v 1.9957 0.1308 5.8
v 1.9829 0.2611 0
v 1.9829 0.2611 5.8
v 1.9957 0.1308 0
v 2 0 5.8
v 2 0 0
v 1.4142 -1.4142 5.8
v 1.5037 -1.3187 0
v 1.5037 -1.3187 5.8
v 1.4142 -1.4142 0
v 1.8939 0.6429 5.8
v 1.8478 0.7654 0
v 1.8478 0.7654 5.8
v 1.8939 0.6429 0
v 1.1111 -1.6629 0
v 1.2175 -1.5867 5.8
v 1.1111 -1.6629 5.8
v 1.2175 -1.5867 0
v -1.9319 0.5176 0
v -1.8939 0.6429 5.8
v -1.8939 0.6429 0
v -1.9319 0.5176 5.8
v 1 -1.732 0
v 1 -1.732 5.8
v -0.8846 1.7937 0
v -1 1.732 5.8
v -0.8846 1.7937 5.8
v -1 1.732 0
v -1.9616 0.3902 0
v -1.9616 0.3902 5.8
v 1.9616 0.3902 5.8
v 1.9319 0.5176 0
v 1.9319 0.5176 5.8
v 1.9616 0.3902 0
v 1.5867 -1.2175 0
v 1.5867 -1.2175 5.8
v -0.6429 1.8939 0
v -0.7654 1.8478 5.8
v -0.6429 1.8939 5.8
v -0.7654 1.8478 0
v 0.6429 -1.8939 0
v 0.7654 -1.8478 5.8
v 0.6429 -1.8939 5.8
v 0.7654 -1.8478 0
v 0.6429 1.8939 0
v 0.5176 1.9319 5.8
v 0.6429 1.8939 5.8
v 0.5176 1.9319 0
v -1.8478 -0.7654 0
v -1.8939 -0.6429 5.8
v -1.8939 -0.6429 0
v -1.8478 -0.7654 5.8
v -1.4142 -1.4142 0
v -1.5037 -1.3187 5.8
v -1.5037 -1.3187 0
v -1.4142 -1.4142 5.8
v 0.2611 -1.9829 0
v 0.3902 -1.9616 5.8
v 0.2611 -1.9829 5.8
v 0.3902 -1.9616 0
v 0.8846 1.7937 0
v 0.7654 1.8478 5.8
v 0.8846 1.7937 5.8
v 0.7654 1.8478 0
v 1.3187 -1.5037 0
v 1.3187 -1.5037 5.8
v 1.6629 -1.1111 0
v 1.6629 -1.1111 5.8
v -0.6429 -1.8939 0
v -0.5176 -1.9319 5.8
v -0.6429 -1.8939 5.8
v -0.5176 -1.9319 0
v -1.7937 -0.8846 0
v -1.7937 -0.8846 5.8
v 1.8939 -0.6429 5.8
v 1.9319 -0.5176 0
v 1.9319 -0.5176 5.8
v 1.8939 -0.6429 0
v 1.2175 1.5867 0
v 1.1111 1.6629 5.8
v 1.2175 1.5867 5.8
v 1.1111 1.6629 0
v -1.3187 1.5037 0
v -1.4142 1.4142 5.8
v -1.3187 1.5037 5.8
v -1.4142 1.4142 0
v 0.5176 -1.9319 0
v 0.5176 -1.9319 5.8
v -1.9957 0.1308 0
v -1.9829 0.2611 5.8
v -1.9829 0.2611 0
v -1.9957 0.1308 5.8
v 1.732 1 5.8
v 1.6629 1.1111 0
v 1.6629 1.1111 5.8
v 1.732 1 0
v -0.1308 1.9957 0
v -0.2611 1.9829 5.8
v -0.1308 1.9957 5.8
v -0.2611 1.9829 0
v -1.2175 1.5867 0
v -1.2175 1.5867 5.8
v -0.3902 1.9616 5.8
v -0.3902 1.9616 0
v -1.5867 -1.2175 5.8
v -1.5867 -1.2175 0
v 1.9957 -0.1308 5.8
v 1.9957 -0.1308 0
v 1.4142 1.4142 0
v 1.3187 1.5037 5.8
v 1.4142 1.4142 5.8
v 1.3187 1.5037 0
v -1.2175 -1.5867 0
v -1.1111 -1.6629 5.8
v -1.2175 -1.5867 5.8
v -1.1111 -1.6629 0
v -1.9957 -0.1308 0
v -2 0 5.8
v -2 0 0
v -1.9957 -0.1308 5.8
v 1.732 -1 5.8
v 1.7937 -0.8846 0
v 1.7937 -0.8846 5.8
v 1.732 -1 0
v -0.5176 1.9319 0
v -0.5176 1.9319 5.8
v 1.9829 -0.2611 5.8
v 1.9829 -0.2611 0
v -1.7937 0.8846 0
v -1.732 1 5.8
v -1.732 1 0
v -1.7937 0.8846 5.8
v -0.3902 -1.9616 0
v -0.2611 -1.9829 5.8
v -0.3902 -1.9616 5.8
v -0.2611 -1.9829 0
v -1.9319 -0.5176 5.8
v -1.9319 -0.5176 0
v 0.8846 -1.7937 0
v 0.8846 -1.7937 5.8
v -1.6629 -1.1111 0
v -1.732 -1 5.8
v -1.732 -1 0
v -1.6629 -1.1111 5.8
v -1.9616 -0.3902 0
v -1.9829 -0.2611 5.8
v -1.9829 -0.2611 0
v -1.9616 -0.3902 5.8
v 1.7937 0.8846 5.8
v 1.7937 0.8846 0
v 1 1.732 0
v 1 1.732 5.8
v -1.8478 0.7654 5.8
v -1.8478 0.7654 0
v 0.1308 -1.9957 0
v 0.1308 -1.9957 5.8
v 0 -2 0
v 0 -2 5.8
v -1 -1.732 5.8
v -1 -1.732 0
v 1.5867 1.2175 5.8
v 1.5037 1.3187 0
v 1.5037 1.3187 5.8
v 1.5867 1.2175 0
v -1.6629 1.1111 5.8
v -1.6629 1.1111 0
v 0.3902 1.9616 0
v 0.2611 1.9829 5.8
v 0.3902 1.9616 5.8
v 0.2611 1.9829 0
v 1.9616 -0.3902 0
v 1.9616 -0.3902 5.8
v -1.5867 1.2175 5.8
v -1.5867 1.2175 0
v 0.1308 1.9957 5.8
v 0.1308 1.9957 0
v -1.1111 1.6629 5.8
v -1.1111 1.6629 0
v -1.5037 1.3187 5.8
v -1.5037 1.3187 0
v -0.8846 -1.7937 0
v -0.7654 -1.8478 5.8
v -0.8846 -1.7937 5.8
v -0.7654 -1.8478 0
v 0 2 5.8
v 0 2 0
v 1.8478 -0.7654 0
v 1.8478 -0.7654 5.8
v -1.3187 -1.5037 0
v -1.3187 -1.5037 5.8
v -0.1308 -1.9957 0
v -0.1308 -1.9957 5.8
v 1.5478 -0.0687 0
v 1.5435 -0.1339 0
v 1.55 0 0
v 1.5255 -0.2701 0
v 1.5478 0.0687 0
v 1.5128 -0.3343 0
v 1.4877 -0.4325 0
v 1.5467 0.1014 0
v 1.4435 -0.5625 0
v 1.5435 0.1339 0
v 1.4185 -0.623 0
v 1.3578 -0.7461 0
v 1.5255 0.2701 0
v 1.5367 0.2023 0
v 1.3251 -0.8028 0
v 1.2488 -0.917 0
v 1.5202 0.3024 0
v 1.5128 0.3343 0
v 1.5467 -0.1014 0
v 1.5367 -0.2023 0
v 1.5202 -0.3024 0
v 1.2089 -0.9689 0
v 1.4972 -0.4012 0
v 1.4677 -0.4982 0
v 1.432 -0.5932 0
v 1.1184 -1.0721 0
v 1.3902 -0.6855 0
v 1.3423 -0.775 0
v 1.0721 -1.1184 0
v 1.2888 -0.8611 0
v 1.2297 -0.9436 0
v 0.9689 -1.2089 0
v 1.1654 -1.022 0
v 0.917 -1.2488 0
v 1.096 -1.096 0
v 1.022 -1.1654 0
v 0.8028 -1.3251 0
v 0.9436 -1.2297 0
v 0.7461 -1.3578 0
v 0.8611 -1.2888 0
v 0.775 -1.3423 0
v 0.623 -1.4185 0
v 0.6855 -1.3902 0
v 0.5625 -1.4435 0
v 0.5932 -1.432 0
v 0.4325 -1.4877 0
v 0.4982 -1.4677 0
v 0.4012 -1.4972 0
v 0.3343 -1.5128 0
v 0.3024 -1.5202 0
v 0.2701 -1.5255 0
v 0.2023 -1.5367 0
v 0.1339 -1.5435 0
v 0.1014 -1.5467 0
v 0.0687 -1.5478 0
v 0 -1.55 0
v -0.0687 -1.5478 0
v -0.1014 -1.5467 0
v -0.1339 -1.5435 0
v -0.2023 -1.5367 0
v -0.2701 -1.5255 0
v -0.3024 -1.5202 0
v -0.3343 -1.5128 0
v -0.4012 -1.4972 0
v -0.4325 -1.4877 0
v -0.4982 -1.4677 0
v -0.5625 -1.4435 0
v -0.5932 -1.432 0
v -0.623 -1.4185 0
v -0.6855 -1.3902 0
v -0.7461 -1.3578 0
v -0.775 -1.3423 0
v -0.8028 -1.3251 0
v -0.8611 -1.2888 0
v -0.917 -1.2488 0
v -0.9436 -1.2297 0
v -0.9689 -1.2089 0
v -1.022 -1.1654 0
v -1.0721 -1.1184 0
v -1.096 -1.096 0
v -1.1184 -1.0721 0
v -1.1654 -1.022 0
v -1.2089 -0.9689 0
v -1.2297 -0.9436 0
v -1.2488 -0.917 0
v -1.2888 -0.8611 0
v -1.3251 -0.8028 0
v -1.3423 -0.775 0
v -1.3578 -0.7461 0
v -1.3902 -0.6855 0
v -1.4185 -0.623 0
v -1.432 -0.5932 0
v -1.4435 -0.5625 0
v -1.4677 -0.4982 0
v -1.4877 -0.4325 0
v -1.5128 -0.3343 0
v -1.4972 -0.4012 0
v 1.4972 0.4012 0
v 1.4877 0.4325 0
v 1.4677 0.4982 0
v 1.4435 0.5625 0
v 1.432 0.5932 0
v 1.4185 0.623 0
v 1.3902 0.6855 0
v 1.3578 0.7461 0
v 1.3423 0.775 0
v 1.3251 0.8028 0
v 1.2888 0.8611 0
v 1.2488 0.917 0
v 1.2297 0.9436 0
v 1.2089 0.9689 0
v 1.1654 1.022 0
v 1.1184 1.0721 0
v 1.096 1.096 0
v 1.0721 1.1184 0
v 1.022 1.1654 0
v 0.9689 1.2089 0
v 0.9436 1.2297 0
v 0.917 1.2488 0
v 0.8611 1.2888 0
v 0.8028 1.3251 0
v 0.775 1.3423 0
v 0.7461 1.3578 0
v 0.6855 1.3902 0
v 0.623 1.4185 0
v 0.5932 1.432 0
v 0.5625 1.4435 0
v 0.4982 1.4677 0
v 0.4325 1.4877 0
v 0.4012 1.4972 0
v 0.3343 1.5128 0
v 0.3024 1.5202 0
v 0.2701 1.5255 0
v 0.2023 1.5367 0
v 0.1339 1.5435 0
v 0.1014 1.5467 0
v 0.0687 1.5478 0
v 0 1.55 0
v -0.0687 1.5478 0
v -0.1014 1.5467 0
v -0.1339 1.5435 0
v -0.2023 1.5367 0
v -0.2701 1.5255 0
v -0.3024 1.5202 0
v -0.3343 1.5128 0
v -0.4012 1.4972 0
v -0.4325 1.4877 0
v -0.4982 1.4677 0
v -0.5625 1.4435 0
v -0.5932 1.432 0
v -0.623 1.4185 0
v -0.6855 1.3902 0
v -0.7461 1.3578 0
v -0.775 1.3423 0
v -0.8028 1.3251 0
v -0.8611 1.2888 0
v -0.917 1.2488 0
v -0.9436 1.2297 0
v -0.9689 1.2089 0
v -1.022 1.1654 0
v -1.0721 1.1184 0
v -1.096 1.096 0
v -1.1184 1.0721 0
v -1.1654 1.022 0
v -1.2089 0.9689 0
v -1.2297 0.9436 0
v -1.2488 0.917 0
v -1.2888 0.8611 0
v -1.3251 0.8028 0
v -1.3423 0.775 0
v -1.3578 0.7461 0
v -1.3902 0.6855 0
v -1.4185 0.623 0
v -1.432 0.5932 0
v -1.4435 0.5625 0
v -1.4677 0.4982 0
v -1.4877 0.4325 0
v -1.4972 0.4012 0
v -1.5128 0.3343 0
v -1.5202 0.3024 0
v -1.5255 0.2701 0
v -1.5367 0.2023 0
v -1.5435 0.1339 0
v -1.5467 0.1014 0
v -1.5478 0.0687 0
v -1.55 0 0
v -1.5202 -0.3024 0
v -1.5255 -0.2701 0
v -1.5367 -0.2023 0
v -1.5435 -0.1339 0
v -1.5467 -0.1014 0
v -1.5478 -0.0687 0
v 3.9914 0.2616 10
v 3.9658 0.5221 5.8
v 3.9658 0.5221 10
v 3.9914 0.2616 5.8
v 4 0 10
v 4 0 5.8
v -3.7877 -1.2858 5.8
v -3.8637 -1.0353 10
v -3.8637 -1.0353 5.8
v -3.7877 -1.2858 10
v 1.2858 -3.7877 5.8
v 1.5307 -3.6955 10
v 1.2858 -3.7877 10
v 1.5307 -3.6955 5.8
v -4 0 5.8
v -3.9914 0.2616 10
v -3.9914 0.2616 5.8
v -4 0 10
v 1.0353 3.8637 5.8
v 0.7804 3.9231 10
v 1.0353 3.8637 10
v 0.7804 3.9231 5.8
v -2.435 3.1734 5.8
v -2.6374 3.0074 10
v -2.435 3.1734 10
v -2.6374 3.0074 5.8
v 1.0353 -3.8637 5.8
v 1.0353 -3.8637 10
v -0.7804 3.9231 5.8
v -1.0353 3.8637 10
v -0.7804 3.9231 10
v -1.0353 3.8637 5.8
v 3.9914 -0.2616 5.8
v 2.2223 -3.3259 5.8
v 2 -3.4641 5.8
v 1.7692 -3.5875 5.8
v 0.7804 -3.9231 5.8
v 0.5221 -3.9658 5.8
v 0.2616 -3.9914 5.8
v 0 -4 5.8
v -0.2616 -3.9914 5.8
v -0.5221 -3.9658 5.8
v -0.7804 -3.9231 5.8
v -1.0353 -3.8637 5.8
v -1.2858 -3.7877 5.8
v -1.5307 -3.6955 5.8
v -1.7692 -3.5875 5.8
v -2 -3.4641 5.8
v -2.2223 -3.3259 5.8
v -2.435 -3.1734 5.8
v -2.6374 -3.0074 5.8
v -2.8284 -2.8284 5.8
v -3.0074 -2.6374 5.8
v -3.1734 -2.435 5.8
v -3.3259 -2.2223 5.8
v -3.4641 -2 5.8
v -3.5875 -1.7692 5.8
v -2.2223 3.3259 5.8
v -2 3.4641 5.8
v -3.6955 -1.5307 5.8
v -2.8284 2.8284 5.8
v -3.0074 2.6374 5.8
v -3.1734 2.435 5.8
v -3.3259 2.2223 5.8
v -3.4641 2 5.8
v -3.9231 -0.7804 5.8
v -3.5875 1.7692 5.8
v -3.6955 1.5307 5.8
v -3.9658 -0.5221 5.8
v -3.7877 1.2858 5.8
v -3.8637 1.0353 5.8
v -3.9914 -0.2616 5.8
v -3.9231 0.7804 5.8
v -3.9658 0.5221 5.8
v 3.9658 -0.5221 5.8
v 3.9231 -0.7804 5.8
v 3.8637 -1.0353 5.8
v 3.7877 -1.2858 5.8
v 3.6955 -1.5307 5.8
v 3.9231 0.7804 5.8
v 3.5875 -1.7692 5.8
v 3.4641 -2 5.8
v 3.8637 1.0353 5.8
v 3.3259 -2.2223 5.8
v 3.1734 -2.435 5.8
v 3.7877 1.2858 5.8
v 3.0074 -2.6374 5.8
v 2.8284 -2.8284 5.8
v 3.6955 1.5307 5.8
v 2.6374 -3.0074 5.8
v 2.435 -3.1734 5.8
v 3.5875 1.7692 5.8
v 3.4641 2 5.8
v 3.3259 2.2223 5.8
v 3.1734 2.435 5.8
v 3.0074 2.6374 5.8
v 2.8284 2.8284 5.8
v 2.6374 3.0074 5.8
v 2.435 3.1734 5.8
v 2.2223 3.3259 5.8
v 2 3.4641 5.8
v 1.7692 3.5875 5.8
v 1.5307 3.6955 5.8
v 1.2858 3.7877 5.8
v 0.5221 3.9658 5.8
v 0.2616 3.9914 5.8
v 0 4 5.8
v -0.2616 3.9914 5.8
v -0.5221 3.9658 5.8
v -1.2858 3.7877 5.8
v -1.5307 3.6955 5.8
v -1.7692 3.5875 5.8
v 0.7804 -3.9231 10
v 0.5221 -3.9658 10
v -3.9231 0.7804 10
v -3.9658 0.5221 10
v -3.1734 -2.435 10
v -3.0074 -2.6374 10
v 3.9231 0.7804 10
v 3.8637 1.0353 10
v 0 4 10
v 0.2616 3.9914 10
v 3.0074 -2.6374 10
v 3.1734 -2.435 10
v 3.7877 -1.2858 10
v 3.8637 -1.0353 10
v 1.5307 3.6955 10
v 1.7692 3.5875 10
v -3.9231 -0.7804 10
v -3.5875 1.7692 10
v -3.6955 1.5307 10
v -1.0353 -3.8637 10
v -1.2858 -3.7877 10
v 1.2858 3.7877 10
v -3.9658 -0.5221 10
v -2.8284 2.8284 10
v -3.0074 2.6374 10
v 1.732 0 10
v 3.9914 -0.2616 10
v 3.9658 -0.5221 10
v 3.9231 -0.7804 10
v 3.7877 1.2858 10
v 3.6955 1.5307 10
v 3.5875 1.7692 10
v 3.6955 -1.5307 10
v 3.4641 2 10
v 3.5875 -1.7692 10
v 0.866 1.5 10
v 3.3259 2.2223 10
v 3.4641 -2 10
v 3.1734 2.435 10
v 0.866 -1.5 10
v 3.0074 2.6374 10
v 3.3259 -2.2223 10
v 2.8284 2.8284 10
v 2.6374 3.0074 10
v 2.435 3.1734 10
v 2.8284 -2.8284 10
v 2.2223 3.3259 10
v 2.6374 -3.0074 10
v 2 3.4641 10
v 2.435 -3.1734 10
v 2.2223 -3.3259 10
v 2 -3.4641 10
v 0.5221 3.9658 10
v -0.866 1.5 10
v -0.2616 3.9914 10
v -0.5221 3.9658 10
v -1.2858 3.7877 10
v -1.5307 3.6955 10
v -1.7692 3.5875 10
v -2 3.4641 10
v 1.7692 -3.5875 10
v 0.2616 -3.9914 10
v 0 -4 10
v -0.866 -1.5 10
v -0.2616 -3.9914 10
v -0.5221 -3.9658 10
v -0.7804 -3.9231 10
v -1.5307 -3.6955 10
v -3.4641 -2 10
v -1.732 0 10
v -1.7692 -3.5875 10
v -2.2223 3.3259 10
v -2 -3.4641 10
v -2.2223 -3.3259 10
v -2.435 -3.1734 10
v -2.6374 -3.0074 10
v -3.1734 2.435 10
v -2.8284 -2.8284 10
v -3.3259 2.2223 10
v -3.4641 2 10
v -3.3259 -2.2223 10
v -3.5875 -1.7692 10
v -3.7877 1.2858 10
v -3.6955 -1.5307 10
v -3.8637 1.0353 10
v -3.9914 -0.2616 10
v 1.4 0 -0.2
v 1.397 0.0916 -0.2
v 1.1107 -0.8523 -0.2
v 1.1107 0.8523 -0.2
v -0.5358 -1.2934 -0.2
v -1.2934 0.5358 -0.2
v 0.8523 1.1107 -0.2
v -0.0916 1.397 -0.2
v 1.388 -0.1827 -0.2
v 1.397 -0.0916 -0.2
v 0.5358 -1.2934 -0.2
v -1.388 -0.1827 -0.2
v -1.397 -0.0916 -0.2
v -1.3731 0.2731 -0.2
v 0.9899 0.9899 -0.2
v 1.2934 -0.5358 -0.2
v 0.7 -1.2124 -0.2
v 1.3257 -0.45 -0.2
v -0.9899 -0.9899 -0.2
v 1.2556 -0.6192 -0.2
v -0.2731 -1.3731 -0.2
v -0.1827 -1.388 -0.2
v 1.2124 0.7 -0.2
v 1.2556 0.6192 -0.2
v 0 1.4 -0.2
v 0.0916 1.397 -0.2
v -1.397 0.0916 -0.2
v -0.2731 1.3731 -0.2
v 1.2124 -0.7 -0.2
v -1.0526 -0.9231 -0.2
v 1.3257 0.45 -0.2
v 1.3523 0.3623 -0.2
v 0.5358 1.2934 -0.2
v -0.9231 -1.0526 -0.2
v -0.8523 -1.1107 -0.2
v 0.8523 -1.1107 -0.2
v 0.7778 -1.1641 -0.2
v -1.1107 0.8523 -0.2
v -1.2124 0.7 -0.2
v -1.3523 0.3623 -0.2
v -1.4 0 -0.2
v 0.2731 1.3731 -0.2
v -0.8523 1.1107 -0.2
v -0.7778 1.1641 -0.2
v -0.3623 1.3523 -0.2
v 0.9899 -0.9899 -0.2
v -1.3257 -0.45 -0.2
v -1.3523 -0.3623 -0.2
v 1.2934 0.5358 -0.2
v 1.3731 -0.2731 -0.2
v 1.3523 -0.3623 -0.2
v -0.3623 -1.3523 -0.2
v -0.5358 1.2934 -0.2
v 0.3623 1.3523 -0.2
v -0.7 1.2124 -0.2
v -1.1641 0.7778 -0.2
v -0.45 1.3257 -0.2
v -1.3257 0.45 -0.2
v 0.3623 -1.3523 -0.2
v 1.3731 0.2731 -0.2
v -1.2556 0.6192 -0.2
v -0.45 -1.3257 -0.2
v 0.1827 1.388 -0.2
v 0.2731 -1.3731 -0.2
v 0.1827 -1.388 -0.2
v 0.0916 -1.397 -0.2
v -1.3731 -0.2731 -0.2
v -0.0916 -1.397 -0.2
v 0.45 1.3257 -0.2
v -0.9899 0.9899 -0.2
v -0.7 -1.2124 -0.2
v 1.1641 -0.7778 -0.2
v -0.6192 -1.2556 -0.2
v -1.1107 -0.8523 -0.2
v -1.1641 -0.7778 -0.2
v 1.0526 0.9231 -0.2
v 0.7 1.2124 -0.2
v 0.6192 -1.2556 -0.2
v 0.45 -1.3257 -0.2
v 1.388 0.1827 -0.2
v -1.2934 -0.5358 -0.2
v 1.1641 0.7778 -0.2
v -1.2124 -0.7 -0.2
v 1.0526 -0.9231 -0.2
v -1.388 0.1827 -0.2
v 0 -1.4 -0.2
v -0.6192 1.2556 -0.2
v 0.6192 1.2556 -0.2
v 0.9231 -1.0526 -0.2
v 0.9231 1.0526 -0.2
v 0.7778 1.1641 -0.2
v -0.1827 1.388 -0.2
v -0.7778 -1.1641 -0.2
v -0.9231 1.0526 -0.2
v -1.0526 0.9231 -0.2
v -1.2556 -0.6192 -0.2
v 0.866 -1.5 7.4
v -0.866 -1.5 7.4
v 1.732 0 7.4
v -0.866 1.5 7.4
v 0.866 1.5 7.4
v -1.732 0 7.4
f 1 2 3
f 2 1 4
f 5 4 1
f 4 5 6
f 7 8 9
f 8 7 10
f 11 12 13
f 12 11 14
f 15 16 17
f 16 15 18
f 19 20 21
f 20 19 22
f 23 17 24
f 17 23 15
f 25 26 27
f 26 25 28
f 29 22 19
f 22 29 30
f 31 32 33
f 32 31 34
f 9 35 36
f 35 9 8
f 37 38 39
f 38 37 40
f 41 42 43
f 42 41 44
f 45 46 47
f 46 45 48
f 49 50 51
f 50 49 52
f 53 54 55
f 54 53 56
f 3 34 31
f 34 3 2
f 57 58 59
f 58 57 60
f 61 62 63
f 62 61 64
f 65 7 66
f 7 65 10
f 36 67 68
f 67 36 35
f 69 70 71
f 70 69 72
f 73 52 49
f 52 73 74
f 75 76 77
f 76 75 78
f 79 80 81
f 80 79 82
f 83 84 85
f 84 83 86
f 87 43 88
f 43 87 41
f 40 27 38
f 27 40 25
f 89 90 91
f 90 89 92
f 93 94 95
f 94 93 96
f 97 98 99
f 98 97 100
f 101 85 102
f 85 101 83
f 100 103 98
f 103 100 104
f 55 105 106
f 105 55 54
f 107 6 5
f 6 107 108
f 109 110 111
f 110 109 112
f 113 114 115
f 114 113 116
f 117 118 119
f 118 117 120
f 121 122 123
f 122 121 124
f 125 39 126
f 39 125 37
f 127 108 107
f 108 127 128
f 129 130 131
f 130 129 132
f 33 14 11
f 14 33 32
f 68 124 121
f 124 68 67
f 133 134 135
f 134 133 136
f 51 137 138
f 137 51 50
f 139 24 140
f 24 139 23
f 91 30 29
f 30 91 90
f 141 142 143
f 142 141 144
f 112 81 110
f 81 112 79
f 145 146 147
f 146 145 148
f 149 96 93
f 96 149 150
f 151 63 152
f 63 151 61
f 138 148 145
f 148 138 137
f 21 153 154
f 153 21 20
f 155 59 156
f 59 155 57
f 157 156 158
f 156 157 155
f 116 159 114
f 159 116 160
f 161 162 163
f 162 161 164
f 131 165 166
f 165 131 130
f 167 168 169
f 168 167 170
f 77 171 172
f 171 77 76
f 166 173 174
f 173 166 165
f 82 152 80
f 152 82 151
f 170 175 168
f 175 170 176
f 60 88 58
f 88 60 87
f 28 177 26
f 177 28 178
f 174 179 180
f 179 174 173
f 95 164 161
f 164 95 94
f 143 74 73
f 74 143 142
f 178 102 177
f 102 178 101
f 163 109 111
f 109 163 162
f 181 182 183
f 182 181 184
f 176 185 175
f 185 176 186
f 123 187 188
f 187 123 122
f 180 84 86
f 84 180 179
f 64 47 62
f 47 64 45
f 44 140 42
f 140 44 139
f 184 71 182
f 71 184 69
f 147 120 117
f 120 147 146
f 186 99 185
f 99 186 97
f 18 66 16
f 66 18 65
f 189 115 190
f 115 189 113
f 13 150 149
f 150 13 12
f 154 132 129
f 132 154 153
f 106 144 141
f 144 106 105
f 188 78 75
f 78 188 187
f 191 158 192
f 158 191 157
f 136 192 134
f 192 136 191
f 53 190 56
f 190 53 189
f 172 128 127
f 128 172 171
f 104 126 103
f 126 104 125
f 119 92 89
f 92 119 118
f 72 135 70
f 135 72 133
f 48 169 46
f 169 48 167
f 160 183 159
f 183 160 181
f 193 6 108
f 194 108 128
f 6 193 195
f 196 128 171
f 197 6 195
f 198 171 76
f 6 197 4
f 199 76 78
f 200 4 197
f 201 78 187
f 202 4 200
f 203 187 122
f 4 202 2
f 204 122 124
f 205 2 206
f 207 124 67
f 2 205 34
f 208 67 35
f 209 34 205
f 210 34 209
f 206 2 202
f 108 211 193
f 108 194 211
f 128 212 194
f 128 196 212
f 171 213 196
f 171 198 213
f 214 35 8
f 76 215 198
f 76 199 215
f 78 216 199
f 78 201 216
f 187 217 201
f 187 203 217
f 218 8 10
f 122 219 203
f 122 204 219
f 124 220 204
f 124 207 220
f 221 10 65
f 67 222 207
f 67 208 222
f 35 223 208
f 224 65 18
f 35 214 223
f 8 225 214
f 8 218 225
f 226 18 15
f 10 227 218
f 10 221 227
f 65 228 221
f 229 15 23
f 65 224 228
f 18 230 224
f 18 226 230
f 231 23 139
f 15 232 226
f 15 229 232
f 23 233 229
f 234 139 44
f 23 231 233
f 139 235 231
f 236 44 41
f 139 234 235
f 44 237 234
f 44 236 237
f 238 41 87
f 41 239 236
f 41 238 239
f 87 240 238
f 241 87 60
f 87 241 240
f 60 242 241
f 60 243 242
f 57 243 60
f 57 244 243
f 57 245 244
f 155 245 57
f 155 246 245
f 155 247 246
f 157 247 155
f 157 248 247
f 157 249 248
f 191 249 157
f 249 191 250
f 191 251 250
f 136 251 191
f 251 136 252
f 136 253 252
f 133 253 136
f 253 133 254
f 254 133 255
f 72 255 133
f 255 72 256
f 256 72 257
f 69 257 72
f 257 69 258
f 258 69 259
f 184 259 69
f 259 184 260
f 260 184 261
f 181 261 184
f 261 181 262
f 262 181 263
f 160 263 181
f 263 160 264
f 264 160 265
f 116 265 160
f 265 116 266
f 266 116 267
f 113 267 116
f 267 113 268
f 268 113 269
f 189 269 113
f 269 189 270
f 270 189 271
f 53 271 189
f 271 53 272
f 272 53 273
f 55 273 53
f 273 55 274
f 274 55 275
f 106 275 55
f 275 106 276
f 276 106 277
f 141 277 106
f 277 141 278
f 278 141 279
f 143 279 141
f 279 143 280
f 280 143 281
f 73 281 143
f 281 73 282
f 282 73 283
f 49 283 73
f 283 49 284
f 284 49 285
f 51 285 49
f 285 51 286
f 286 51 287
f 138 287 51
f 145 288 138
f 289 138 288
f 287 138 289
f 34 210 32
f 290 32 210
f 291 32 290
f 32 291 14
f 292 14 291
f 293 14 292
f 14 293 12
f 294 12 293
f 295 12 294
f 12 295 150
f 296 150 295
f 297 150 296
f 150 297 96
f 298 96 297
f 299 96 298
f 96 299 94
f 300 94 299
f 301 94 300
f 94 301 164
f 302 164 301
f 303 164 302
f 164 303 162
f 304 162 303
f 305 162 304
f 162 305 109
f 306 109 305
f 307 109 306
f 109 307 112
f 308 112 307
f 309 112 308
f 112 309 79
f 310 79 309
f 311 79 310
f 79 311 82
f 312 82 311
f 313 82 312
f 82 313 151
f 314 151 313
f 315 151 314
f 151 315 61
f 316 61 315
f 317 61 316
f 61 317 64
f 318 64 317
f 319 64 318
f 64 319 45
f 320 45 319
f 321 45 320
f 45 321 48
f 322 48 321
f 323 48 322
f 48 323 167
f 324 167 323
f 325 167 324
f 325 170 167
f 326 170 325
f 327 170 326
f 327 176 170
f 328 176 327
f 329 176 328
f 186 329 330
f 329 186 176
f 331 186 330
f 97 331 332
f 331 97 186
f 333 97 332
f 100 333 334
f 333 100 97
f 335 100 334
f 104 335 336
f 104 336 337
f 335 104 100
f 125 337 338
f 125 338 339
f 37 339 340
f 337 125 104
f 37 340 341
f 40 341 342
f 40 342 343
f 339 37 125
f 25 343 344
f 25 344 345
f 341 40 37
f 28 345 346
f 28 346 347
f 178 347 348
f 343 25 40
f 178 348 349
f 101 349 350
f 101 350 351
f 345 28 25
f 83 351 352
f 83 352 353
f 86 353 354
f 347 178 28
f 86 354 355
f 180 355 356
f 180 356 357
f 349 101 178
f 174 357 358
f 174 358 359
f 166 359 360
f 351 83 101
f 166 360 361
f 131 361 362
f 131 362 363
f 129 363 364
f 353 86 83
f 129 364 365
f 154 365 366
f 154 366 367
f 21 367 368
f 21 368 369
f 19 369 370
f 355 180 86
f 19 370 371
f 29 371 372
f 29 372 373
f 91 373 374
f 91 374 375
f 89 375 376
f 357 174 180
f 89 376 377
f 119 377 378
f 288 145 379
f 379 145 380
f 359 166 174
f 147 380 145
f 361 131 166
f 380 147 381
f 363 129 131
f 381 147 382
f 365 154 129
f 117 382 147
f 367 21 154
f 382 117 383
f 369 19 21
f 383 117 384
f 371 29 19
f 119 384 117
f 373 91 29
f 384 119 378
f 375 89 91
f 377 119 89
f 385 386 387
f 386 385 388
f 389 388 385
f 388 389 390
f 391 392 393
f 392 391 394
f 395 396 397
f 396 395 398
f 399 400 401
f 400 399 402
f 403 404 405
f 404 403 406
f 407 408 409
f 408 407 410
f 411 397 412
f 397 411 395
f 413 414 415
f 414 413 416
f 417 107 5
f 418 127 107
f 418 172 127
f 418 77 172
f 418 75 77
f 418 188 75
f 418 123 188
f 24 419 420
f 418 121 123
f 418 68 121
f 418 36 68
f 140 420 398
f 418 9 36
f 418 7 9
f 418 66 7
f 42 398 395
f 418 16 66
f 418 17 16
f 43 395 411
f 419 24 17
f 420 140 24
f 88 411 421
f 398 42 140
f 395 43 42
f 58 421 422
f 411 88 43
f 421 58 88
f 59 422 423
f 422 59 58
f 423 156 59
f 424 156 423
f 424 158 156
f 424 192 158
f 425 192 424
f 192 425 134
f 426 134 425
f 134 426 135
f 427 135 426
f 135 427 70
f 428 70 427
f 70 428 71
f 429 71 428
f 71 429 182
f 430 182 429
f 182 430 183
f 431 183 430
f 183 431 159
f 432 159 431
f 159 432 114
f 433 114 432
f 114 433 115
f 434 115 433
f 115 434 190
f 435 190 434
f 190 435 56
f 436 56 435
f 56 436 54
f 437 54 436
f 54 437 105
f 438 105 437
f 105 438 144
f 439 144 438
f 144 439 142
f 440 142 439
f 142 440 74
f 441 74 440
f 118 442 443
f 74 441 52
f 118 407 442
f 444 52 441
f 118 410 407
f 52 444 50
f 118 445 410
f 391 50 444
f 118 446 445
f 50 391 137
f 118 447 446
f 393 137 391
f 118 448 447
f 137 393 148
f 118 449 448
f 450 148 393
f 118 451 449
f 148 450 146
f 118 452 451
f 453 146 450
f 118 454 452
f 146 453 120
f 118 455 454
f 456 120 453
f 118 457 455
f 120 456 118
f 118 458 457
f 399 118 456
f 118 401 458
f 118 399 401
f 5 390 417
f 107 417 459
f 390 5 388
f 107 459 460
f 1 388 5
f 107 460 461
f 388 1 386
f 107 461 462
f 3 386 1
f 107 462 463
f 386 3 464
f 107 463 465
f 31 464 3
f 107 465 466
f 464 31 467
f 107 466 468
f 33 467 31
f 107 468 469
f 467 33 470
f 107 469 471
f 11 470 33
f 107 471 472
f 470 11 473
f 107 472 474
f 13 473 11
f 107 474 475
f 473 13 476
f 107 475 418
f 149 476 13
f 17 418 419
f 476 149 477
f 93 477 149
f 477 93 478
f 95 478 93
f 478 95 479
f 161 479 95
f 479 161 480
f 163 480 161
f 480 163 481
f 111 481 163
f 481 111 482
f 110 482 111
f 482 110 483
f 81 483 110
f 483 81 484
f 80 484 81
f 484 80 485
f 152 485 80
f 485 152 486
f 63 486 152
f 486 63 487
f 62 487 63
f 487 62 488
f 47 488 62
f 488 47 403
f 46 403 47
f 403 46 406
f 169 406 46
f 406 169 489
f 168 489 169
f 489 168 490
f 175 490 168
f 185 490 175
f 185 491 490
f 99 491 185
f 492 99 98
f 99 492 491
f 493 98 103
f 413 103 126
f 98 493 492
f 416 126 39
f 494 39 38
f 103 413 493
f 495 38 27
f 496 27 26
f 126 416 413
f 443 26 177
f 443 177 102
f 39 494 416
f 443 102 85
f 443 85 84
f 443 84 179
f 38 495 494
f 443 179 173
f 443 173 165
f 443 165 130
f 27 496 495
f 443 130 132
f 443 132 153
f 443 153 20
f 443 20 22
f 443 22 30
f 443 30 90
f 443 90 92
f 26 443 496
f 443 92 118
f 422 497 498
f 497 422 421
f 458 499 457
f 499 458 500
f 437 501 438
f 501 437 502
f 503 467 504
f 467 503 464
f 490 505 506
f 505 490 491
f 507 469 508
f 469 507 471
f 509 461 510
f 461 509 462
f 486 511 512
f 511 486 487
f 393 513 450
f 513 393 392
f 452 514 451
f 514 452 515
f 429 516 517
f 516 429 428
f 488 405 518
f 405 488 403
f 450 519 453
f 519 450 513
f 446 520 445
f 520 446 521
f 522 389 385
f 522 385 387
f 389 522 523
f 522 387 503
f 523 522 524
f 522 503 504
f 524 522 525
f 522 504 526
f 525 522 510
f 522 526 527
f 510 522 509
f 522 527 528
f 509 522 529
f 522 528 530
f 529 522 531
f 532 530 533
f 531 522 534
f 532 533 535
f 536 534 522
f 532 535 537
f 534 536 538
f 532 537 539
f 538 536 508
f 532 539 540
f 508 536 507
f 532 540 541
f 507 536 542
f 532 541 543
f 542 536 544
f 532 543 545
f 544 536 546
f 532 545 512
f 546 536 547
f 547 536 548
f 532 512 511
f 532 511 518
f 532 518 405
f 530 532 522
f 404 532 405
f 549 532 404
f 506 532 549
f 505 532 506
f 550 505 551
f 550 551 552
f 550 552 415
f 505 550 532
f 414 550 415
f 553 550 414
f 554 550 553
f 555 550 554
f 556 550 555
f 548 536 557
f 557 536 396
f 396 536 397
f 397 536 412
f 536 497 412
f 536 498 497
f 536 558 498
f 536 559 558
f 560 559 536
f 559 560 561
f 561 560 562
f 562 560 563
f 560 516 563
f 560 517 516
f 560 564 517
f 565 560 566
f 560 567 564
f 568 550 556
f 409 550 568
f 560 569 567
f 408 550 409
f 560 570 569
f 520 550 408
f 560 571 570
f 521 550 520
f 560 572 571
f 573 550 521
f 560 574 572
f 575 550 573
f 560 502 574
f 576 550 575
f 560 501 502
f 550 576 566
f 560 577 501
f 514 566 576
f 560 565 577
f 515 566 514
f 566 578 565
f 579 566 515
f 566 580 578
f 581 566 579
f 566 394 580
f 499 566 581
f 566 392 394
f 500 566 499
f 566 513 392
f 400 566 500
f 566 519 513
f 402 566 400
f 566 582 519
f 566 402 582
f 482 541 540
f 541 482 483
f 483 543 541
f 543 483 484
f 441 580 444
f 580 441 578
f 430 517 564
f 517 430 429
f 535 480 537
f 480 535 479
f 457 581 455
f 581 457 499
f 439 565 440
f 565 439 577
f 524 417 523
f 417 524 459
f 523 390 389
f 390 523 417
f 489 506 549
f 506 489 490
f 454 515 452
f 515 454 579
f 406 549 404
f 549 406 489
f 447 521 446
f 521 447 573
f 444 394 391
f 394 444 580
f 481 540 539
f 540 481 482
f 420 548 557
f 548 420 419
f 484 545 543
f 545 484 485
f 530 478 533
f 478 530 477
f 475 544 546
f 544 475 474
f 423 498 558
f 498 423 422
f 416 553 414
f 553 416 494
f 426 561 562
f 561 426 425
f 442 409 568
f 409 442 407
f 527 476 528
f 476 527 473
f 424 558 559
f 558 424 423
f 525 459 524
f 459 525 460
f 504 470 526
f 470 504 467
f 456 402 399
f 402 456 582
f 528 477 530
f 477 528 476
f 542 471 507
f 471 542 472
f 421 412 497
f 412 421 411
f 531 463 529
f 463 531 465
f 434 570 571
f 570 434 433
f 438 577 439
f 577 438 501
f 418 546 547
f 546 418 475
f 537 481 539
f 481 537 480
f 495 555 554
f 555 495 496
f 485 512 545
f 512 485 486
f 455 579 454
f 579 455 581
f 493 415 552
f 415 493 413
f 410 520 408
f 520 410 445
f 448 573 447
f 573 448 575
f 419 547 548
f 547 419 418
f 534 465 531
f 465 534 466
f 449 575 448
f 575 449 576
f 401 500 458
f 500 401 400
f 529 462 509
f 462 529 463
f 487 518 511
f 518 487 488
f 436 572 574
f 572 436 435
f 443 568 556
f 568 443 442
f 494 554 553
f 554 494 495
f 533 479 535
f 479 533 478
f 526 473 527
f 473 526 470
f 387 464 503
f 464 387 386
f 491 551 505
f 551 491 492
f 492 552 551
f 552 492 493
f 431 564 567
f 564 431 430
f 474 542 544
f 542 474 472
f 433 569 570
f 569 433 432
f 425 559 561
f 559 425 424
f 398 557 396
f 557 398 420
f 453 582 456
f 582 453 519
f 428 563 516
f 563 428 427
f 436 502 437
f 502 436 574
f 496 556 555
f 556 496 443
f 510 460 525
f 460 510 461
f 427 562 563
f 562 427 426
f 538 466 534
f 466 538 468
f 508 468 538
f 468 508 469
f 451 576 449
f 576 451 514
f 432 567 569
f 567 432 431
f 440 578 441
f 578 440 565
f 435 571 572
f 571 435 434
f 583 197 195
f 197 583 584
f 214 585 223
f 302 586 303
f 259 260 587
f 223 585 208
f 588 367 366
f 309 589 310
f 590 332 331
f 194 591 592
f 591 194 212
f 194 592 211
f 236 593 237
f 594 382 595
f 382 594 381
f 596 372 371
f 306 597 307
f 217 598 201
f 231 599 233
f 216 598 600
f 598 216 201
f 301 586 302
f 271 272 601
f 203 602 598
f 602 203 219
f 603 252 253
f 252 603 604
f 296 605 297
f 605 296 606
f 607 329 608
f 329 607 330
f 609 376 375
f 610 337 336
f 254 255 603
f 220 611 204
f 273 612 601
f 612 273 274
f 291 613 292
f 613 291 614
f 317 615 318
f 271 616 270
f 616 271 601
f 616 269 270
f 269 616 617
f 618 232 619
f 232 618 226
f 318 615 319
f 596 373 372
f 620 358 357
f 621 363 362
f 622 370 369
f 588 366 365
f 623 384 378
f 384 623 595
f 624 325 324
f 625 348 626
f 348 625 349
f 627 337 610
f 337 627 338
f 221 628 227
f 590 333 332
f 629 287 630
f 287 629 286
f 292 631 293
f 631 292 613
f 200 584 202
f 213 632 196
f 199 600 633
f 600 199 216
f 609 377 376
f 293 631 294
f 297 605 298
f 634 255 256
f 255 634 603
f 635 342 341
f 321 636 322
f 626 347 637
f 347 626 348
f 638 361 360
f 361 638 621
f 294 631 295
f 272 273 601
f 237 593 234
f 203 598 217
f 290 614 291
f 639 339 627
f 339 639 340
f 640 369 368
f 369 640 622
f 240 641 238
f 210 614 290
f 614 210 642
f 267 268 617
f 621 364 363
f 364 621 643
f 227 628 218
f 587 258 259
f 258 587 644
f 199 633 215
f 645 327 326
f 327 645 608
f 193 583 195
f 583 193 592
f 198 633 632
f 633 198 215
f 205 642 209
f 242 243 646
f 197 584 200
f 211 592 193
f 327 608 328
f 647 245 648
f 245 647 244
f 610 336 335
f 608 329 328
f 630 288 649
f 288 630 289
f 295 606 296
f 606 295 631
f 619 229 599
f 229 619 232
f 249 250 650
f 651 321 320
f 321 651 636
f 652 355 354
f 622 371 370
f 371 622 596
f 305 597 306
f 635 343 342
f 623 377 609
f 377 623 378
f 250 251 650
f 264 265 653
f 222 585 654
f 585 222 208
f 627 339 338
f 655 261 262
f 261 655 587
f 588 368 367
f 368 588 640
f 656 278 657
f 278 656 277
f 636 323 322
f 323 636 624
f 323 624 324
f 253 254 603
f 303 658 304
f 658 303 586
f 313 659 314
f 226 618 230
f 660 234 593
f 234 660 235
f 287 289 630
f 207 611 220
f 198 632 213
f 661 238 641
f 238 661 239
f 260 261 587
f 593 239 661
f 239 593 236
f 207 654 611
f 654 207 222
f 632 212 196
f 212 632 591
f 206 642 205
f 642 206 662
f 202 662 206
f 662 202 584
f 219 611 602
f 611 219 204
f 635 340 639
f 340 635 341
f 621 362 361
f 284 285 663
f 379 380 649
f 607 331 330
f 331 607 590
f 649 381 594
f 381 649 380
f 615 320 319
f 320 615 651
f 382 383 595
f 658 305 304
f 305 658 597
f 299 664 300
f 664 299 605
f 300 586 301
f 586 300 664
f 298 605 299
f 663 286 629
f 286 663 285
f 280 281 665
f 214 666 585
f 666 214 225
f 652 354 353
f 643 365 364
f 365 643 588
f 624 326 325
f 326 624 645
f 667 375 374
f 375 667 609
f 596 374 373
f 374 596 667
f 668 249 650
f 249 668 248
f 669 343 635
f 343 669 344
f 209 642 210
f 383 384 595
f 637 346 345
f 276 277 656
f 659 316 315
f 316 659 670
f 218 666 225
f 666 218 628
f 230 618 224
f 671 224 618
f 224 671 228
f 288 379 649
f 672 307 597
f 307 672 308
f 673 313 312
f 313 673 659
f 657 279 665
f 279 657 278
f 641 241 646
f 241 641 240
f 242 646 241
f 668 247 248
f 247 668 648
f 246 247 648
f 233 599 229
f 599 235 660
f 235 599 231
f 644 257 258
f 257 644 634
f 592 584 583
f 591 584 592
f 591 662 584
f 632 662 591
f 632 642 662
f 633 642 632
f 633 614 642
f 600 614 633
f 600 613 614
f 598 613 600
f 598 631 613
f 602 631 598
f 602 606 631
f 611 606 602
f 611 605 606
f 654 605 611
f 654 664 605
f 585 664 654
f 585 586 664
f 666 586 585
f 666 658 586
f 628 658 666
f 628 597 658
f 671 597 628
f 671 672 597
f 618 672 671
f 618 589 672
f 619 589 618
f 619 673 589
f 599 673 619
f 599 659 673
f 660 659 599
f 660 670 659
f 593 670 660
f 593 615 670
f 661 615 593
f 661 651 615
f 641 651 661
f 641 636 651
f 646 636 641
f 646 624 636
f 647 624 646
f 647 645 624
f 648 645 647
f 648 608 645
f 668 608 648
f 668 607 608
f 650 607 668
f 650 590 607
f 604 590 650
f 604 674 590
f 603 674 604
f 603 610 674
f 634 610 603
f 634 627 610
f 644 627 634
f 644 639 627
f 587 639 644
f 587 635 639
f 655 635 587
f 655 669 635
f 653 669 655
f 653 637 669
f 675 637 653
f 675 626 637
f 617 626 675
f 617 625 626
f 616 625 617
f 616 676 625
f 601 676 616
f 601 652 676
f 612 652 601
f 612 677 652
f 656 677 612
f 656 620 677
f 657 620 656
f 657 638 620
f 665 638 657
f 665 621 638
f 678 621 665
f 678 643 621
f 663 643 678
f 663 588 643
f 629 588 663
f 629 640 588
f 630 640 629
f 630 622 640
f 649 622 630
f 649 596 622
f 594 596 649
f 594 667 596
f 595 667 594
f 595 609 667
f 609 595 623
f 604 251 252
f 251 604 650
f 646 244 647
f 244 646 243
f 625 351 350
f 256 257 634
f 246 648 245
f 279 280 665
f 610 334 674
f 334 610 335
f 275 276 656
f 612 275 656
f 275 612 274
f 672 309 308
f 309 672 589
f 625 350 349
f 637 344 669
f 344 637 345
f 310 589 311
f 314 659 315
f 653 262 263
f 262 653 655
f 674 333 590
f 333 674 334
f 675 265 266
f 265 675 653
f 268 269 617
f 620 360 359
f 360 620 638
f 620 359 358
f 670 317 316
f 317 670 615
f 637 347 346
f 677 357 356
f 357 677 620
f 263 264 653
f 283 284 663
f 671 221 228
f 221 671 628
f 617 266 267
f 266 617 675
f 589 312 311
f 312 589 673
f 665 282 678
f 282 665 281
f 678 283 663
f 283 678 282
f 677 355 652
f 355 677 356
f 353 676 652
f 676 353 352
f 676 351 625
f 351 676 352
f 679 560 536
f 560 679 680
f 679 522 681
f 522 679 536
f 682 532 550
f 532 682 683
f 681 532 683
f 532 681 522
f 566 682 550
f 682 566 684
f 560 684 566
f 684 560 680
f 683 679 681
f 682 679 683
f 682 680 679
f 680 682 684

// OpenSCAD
// Socket Head Cap Screw (M4 x 10) - single connected solid
// Requested: 4.0mm shank diameter, 8.0mm head diameter, 10.0mm overall length

$fn = 96;

// Parameters
thread_diameter_mm = 4.0;          // shank diameter
length_mm = 10.0;                  // overall length (head + shank)
head_diameter_mm = 8.0;            // head diameter
head_height_mm = 4.0;              // head height
hex_socket_across_flats_mm = 3.0;  // typical for M4
hex_socket_depth_mm = 2.5;         // typical
chamfer_mm = 0.6;                  // tip chamfer height
overlap_mm = 0.2;                  // overlap to avoid coincident faces

// Derived
shank_len_mm = max(0, length_mm - head_height_mm);
shank_r = thread_diameter_mm / 2;
head_r  = head_diameter_mm / 2;

// Hex geometry: across flats -> circumradius
hex_R = hex_socket_across_flats_mm / (2 * cos(30));

module socket_head_cap_screw() {
    // Place the whole screw so it spans z=[0..length_mm] for predictable viewing
    translate([0, 0, length_mm/2])
    difference() {
        union() {
            // Shank: z=[-length_mm/2 .. -length_mm/2 + shank_len_mm]
            if (shank_len_mm > 0)
                translate([0, 0, -length_mm/2 + shank_len_mm/2])
                    cylinder(h = shank_len_mm, r = shank_r, center = true);

            // Head: directly on top of shank with slight overlap
            translate([0, 0, -length_mm/2 + shank_len_mm + head_height_mm/2 - overlap_mm/2])
                cylinder(h = head_height_mm + overlap_mm, r = head_r, center = true);

            // Tip chamfer: attached to shank bottom with slight overlap
            if (shank_len_mm > 0 && chamfer_mm > 0)
                translate([0, 0, -length_mm/2 + chamfer_mm/2 - overlap_mm/2])
                    cylinder(
                        h = chamfer_mm + overlap_mm,
                        r1 = max(0, shank_r - chamfer_mm),
                        r2 = shank_r,
                        center = true
                    );
        }

        // Hex socket recess: cut from top of head downward
        translate([0, 0, length_mm/2 - hex_socket_depth_mm/2])
            cylinder(h = hex_socket_depth_mm + overlap_mm, r = hex_R, center = true, $fn = 6);
    }
}

socket_head_cap_screw();
